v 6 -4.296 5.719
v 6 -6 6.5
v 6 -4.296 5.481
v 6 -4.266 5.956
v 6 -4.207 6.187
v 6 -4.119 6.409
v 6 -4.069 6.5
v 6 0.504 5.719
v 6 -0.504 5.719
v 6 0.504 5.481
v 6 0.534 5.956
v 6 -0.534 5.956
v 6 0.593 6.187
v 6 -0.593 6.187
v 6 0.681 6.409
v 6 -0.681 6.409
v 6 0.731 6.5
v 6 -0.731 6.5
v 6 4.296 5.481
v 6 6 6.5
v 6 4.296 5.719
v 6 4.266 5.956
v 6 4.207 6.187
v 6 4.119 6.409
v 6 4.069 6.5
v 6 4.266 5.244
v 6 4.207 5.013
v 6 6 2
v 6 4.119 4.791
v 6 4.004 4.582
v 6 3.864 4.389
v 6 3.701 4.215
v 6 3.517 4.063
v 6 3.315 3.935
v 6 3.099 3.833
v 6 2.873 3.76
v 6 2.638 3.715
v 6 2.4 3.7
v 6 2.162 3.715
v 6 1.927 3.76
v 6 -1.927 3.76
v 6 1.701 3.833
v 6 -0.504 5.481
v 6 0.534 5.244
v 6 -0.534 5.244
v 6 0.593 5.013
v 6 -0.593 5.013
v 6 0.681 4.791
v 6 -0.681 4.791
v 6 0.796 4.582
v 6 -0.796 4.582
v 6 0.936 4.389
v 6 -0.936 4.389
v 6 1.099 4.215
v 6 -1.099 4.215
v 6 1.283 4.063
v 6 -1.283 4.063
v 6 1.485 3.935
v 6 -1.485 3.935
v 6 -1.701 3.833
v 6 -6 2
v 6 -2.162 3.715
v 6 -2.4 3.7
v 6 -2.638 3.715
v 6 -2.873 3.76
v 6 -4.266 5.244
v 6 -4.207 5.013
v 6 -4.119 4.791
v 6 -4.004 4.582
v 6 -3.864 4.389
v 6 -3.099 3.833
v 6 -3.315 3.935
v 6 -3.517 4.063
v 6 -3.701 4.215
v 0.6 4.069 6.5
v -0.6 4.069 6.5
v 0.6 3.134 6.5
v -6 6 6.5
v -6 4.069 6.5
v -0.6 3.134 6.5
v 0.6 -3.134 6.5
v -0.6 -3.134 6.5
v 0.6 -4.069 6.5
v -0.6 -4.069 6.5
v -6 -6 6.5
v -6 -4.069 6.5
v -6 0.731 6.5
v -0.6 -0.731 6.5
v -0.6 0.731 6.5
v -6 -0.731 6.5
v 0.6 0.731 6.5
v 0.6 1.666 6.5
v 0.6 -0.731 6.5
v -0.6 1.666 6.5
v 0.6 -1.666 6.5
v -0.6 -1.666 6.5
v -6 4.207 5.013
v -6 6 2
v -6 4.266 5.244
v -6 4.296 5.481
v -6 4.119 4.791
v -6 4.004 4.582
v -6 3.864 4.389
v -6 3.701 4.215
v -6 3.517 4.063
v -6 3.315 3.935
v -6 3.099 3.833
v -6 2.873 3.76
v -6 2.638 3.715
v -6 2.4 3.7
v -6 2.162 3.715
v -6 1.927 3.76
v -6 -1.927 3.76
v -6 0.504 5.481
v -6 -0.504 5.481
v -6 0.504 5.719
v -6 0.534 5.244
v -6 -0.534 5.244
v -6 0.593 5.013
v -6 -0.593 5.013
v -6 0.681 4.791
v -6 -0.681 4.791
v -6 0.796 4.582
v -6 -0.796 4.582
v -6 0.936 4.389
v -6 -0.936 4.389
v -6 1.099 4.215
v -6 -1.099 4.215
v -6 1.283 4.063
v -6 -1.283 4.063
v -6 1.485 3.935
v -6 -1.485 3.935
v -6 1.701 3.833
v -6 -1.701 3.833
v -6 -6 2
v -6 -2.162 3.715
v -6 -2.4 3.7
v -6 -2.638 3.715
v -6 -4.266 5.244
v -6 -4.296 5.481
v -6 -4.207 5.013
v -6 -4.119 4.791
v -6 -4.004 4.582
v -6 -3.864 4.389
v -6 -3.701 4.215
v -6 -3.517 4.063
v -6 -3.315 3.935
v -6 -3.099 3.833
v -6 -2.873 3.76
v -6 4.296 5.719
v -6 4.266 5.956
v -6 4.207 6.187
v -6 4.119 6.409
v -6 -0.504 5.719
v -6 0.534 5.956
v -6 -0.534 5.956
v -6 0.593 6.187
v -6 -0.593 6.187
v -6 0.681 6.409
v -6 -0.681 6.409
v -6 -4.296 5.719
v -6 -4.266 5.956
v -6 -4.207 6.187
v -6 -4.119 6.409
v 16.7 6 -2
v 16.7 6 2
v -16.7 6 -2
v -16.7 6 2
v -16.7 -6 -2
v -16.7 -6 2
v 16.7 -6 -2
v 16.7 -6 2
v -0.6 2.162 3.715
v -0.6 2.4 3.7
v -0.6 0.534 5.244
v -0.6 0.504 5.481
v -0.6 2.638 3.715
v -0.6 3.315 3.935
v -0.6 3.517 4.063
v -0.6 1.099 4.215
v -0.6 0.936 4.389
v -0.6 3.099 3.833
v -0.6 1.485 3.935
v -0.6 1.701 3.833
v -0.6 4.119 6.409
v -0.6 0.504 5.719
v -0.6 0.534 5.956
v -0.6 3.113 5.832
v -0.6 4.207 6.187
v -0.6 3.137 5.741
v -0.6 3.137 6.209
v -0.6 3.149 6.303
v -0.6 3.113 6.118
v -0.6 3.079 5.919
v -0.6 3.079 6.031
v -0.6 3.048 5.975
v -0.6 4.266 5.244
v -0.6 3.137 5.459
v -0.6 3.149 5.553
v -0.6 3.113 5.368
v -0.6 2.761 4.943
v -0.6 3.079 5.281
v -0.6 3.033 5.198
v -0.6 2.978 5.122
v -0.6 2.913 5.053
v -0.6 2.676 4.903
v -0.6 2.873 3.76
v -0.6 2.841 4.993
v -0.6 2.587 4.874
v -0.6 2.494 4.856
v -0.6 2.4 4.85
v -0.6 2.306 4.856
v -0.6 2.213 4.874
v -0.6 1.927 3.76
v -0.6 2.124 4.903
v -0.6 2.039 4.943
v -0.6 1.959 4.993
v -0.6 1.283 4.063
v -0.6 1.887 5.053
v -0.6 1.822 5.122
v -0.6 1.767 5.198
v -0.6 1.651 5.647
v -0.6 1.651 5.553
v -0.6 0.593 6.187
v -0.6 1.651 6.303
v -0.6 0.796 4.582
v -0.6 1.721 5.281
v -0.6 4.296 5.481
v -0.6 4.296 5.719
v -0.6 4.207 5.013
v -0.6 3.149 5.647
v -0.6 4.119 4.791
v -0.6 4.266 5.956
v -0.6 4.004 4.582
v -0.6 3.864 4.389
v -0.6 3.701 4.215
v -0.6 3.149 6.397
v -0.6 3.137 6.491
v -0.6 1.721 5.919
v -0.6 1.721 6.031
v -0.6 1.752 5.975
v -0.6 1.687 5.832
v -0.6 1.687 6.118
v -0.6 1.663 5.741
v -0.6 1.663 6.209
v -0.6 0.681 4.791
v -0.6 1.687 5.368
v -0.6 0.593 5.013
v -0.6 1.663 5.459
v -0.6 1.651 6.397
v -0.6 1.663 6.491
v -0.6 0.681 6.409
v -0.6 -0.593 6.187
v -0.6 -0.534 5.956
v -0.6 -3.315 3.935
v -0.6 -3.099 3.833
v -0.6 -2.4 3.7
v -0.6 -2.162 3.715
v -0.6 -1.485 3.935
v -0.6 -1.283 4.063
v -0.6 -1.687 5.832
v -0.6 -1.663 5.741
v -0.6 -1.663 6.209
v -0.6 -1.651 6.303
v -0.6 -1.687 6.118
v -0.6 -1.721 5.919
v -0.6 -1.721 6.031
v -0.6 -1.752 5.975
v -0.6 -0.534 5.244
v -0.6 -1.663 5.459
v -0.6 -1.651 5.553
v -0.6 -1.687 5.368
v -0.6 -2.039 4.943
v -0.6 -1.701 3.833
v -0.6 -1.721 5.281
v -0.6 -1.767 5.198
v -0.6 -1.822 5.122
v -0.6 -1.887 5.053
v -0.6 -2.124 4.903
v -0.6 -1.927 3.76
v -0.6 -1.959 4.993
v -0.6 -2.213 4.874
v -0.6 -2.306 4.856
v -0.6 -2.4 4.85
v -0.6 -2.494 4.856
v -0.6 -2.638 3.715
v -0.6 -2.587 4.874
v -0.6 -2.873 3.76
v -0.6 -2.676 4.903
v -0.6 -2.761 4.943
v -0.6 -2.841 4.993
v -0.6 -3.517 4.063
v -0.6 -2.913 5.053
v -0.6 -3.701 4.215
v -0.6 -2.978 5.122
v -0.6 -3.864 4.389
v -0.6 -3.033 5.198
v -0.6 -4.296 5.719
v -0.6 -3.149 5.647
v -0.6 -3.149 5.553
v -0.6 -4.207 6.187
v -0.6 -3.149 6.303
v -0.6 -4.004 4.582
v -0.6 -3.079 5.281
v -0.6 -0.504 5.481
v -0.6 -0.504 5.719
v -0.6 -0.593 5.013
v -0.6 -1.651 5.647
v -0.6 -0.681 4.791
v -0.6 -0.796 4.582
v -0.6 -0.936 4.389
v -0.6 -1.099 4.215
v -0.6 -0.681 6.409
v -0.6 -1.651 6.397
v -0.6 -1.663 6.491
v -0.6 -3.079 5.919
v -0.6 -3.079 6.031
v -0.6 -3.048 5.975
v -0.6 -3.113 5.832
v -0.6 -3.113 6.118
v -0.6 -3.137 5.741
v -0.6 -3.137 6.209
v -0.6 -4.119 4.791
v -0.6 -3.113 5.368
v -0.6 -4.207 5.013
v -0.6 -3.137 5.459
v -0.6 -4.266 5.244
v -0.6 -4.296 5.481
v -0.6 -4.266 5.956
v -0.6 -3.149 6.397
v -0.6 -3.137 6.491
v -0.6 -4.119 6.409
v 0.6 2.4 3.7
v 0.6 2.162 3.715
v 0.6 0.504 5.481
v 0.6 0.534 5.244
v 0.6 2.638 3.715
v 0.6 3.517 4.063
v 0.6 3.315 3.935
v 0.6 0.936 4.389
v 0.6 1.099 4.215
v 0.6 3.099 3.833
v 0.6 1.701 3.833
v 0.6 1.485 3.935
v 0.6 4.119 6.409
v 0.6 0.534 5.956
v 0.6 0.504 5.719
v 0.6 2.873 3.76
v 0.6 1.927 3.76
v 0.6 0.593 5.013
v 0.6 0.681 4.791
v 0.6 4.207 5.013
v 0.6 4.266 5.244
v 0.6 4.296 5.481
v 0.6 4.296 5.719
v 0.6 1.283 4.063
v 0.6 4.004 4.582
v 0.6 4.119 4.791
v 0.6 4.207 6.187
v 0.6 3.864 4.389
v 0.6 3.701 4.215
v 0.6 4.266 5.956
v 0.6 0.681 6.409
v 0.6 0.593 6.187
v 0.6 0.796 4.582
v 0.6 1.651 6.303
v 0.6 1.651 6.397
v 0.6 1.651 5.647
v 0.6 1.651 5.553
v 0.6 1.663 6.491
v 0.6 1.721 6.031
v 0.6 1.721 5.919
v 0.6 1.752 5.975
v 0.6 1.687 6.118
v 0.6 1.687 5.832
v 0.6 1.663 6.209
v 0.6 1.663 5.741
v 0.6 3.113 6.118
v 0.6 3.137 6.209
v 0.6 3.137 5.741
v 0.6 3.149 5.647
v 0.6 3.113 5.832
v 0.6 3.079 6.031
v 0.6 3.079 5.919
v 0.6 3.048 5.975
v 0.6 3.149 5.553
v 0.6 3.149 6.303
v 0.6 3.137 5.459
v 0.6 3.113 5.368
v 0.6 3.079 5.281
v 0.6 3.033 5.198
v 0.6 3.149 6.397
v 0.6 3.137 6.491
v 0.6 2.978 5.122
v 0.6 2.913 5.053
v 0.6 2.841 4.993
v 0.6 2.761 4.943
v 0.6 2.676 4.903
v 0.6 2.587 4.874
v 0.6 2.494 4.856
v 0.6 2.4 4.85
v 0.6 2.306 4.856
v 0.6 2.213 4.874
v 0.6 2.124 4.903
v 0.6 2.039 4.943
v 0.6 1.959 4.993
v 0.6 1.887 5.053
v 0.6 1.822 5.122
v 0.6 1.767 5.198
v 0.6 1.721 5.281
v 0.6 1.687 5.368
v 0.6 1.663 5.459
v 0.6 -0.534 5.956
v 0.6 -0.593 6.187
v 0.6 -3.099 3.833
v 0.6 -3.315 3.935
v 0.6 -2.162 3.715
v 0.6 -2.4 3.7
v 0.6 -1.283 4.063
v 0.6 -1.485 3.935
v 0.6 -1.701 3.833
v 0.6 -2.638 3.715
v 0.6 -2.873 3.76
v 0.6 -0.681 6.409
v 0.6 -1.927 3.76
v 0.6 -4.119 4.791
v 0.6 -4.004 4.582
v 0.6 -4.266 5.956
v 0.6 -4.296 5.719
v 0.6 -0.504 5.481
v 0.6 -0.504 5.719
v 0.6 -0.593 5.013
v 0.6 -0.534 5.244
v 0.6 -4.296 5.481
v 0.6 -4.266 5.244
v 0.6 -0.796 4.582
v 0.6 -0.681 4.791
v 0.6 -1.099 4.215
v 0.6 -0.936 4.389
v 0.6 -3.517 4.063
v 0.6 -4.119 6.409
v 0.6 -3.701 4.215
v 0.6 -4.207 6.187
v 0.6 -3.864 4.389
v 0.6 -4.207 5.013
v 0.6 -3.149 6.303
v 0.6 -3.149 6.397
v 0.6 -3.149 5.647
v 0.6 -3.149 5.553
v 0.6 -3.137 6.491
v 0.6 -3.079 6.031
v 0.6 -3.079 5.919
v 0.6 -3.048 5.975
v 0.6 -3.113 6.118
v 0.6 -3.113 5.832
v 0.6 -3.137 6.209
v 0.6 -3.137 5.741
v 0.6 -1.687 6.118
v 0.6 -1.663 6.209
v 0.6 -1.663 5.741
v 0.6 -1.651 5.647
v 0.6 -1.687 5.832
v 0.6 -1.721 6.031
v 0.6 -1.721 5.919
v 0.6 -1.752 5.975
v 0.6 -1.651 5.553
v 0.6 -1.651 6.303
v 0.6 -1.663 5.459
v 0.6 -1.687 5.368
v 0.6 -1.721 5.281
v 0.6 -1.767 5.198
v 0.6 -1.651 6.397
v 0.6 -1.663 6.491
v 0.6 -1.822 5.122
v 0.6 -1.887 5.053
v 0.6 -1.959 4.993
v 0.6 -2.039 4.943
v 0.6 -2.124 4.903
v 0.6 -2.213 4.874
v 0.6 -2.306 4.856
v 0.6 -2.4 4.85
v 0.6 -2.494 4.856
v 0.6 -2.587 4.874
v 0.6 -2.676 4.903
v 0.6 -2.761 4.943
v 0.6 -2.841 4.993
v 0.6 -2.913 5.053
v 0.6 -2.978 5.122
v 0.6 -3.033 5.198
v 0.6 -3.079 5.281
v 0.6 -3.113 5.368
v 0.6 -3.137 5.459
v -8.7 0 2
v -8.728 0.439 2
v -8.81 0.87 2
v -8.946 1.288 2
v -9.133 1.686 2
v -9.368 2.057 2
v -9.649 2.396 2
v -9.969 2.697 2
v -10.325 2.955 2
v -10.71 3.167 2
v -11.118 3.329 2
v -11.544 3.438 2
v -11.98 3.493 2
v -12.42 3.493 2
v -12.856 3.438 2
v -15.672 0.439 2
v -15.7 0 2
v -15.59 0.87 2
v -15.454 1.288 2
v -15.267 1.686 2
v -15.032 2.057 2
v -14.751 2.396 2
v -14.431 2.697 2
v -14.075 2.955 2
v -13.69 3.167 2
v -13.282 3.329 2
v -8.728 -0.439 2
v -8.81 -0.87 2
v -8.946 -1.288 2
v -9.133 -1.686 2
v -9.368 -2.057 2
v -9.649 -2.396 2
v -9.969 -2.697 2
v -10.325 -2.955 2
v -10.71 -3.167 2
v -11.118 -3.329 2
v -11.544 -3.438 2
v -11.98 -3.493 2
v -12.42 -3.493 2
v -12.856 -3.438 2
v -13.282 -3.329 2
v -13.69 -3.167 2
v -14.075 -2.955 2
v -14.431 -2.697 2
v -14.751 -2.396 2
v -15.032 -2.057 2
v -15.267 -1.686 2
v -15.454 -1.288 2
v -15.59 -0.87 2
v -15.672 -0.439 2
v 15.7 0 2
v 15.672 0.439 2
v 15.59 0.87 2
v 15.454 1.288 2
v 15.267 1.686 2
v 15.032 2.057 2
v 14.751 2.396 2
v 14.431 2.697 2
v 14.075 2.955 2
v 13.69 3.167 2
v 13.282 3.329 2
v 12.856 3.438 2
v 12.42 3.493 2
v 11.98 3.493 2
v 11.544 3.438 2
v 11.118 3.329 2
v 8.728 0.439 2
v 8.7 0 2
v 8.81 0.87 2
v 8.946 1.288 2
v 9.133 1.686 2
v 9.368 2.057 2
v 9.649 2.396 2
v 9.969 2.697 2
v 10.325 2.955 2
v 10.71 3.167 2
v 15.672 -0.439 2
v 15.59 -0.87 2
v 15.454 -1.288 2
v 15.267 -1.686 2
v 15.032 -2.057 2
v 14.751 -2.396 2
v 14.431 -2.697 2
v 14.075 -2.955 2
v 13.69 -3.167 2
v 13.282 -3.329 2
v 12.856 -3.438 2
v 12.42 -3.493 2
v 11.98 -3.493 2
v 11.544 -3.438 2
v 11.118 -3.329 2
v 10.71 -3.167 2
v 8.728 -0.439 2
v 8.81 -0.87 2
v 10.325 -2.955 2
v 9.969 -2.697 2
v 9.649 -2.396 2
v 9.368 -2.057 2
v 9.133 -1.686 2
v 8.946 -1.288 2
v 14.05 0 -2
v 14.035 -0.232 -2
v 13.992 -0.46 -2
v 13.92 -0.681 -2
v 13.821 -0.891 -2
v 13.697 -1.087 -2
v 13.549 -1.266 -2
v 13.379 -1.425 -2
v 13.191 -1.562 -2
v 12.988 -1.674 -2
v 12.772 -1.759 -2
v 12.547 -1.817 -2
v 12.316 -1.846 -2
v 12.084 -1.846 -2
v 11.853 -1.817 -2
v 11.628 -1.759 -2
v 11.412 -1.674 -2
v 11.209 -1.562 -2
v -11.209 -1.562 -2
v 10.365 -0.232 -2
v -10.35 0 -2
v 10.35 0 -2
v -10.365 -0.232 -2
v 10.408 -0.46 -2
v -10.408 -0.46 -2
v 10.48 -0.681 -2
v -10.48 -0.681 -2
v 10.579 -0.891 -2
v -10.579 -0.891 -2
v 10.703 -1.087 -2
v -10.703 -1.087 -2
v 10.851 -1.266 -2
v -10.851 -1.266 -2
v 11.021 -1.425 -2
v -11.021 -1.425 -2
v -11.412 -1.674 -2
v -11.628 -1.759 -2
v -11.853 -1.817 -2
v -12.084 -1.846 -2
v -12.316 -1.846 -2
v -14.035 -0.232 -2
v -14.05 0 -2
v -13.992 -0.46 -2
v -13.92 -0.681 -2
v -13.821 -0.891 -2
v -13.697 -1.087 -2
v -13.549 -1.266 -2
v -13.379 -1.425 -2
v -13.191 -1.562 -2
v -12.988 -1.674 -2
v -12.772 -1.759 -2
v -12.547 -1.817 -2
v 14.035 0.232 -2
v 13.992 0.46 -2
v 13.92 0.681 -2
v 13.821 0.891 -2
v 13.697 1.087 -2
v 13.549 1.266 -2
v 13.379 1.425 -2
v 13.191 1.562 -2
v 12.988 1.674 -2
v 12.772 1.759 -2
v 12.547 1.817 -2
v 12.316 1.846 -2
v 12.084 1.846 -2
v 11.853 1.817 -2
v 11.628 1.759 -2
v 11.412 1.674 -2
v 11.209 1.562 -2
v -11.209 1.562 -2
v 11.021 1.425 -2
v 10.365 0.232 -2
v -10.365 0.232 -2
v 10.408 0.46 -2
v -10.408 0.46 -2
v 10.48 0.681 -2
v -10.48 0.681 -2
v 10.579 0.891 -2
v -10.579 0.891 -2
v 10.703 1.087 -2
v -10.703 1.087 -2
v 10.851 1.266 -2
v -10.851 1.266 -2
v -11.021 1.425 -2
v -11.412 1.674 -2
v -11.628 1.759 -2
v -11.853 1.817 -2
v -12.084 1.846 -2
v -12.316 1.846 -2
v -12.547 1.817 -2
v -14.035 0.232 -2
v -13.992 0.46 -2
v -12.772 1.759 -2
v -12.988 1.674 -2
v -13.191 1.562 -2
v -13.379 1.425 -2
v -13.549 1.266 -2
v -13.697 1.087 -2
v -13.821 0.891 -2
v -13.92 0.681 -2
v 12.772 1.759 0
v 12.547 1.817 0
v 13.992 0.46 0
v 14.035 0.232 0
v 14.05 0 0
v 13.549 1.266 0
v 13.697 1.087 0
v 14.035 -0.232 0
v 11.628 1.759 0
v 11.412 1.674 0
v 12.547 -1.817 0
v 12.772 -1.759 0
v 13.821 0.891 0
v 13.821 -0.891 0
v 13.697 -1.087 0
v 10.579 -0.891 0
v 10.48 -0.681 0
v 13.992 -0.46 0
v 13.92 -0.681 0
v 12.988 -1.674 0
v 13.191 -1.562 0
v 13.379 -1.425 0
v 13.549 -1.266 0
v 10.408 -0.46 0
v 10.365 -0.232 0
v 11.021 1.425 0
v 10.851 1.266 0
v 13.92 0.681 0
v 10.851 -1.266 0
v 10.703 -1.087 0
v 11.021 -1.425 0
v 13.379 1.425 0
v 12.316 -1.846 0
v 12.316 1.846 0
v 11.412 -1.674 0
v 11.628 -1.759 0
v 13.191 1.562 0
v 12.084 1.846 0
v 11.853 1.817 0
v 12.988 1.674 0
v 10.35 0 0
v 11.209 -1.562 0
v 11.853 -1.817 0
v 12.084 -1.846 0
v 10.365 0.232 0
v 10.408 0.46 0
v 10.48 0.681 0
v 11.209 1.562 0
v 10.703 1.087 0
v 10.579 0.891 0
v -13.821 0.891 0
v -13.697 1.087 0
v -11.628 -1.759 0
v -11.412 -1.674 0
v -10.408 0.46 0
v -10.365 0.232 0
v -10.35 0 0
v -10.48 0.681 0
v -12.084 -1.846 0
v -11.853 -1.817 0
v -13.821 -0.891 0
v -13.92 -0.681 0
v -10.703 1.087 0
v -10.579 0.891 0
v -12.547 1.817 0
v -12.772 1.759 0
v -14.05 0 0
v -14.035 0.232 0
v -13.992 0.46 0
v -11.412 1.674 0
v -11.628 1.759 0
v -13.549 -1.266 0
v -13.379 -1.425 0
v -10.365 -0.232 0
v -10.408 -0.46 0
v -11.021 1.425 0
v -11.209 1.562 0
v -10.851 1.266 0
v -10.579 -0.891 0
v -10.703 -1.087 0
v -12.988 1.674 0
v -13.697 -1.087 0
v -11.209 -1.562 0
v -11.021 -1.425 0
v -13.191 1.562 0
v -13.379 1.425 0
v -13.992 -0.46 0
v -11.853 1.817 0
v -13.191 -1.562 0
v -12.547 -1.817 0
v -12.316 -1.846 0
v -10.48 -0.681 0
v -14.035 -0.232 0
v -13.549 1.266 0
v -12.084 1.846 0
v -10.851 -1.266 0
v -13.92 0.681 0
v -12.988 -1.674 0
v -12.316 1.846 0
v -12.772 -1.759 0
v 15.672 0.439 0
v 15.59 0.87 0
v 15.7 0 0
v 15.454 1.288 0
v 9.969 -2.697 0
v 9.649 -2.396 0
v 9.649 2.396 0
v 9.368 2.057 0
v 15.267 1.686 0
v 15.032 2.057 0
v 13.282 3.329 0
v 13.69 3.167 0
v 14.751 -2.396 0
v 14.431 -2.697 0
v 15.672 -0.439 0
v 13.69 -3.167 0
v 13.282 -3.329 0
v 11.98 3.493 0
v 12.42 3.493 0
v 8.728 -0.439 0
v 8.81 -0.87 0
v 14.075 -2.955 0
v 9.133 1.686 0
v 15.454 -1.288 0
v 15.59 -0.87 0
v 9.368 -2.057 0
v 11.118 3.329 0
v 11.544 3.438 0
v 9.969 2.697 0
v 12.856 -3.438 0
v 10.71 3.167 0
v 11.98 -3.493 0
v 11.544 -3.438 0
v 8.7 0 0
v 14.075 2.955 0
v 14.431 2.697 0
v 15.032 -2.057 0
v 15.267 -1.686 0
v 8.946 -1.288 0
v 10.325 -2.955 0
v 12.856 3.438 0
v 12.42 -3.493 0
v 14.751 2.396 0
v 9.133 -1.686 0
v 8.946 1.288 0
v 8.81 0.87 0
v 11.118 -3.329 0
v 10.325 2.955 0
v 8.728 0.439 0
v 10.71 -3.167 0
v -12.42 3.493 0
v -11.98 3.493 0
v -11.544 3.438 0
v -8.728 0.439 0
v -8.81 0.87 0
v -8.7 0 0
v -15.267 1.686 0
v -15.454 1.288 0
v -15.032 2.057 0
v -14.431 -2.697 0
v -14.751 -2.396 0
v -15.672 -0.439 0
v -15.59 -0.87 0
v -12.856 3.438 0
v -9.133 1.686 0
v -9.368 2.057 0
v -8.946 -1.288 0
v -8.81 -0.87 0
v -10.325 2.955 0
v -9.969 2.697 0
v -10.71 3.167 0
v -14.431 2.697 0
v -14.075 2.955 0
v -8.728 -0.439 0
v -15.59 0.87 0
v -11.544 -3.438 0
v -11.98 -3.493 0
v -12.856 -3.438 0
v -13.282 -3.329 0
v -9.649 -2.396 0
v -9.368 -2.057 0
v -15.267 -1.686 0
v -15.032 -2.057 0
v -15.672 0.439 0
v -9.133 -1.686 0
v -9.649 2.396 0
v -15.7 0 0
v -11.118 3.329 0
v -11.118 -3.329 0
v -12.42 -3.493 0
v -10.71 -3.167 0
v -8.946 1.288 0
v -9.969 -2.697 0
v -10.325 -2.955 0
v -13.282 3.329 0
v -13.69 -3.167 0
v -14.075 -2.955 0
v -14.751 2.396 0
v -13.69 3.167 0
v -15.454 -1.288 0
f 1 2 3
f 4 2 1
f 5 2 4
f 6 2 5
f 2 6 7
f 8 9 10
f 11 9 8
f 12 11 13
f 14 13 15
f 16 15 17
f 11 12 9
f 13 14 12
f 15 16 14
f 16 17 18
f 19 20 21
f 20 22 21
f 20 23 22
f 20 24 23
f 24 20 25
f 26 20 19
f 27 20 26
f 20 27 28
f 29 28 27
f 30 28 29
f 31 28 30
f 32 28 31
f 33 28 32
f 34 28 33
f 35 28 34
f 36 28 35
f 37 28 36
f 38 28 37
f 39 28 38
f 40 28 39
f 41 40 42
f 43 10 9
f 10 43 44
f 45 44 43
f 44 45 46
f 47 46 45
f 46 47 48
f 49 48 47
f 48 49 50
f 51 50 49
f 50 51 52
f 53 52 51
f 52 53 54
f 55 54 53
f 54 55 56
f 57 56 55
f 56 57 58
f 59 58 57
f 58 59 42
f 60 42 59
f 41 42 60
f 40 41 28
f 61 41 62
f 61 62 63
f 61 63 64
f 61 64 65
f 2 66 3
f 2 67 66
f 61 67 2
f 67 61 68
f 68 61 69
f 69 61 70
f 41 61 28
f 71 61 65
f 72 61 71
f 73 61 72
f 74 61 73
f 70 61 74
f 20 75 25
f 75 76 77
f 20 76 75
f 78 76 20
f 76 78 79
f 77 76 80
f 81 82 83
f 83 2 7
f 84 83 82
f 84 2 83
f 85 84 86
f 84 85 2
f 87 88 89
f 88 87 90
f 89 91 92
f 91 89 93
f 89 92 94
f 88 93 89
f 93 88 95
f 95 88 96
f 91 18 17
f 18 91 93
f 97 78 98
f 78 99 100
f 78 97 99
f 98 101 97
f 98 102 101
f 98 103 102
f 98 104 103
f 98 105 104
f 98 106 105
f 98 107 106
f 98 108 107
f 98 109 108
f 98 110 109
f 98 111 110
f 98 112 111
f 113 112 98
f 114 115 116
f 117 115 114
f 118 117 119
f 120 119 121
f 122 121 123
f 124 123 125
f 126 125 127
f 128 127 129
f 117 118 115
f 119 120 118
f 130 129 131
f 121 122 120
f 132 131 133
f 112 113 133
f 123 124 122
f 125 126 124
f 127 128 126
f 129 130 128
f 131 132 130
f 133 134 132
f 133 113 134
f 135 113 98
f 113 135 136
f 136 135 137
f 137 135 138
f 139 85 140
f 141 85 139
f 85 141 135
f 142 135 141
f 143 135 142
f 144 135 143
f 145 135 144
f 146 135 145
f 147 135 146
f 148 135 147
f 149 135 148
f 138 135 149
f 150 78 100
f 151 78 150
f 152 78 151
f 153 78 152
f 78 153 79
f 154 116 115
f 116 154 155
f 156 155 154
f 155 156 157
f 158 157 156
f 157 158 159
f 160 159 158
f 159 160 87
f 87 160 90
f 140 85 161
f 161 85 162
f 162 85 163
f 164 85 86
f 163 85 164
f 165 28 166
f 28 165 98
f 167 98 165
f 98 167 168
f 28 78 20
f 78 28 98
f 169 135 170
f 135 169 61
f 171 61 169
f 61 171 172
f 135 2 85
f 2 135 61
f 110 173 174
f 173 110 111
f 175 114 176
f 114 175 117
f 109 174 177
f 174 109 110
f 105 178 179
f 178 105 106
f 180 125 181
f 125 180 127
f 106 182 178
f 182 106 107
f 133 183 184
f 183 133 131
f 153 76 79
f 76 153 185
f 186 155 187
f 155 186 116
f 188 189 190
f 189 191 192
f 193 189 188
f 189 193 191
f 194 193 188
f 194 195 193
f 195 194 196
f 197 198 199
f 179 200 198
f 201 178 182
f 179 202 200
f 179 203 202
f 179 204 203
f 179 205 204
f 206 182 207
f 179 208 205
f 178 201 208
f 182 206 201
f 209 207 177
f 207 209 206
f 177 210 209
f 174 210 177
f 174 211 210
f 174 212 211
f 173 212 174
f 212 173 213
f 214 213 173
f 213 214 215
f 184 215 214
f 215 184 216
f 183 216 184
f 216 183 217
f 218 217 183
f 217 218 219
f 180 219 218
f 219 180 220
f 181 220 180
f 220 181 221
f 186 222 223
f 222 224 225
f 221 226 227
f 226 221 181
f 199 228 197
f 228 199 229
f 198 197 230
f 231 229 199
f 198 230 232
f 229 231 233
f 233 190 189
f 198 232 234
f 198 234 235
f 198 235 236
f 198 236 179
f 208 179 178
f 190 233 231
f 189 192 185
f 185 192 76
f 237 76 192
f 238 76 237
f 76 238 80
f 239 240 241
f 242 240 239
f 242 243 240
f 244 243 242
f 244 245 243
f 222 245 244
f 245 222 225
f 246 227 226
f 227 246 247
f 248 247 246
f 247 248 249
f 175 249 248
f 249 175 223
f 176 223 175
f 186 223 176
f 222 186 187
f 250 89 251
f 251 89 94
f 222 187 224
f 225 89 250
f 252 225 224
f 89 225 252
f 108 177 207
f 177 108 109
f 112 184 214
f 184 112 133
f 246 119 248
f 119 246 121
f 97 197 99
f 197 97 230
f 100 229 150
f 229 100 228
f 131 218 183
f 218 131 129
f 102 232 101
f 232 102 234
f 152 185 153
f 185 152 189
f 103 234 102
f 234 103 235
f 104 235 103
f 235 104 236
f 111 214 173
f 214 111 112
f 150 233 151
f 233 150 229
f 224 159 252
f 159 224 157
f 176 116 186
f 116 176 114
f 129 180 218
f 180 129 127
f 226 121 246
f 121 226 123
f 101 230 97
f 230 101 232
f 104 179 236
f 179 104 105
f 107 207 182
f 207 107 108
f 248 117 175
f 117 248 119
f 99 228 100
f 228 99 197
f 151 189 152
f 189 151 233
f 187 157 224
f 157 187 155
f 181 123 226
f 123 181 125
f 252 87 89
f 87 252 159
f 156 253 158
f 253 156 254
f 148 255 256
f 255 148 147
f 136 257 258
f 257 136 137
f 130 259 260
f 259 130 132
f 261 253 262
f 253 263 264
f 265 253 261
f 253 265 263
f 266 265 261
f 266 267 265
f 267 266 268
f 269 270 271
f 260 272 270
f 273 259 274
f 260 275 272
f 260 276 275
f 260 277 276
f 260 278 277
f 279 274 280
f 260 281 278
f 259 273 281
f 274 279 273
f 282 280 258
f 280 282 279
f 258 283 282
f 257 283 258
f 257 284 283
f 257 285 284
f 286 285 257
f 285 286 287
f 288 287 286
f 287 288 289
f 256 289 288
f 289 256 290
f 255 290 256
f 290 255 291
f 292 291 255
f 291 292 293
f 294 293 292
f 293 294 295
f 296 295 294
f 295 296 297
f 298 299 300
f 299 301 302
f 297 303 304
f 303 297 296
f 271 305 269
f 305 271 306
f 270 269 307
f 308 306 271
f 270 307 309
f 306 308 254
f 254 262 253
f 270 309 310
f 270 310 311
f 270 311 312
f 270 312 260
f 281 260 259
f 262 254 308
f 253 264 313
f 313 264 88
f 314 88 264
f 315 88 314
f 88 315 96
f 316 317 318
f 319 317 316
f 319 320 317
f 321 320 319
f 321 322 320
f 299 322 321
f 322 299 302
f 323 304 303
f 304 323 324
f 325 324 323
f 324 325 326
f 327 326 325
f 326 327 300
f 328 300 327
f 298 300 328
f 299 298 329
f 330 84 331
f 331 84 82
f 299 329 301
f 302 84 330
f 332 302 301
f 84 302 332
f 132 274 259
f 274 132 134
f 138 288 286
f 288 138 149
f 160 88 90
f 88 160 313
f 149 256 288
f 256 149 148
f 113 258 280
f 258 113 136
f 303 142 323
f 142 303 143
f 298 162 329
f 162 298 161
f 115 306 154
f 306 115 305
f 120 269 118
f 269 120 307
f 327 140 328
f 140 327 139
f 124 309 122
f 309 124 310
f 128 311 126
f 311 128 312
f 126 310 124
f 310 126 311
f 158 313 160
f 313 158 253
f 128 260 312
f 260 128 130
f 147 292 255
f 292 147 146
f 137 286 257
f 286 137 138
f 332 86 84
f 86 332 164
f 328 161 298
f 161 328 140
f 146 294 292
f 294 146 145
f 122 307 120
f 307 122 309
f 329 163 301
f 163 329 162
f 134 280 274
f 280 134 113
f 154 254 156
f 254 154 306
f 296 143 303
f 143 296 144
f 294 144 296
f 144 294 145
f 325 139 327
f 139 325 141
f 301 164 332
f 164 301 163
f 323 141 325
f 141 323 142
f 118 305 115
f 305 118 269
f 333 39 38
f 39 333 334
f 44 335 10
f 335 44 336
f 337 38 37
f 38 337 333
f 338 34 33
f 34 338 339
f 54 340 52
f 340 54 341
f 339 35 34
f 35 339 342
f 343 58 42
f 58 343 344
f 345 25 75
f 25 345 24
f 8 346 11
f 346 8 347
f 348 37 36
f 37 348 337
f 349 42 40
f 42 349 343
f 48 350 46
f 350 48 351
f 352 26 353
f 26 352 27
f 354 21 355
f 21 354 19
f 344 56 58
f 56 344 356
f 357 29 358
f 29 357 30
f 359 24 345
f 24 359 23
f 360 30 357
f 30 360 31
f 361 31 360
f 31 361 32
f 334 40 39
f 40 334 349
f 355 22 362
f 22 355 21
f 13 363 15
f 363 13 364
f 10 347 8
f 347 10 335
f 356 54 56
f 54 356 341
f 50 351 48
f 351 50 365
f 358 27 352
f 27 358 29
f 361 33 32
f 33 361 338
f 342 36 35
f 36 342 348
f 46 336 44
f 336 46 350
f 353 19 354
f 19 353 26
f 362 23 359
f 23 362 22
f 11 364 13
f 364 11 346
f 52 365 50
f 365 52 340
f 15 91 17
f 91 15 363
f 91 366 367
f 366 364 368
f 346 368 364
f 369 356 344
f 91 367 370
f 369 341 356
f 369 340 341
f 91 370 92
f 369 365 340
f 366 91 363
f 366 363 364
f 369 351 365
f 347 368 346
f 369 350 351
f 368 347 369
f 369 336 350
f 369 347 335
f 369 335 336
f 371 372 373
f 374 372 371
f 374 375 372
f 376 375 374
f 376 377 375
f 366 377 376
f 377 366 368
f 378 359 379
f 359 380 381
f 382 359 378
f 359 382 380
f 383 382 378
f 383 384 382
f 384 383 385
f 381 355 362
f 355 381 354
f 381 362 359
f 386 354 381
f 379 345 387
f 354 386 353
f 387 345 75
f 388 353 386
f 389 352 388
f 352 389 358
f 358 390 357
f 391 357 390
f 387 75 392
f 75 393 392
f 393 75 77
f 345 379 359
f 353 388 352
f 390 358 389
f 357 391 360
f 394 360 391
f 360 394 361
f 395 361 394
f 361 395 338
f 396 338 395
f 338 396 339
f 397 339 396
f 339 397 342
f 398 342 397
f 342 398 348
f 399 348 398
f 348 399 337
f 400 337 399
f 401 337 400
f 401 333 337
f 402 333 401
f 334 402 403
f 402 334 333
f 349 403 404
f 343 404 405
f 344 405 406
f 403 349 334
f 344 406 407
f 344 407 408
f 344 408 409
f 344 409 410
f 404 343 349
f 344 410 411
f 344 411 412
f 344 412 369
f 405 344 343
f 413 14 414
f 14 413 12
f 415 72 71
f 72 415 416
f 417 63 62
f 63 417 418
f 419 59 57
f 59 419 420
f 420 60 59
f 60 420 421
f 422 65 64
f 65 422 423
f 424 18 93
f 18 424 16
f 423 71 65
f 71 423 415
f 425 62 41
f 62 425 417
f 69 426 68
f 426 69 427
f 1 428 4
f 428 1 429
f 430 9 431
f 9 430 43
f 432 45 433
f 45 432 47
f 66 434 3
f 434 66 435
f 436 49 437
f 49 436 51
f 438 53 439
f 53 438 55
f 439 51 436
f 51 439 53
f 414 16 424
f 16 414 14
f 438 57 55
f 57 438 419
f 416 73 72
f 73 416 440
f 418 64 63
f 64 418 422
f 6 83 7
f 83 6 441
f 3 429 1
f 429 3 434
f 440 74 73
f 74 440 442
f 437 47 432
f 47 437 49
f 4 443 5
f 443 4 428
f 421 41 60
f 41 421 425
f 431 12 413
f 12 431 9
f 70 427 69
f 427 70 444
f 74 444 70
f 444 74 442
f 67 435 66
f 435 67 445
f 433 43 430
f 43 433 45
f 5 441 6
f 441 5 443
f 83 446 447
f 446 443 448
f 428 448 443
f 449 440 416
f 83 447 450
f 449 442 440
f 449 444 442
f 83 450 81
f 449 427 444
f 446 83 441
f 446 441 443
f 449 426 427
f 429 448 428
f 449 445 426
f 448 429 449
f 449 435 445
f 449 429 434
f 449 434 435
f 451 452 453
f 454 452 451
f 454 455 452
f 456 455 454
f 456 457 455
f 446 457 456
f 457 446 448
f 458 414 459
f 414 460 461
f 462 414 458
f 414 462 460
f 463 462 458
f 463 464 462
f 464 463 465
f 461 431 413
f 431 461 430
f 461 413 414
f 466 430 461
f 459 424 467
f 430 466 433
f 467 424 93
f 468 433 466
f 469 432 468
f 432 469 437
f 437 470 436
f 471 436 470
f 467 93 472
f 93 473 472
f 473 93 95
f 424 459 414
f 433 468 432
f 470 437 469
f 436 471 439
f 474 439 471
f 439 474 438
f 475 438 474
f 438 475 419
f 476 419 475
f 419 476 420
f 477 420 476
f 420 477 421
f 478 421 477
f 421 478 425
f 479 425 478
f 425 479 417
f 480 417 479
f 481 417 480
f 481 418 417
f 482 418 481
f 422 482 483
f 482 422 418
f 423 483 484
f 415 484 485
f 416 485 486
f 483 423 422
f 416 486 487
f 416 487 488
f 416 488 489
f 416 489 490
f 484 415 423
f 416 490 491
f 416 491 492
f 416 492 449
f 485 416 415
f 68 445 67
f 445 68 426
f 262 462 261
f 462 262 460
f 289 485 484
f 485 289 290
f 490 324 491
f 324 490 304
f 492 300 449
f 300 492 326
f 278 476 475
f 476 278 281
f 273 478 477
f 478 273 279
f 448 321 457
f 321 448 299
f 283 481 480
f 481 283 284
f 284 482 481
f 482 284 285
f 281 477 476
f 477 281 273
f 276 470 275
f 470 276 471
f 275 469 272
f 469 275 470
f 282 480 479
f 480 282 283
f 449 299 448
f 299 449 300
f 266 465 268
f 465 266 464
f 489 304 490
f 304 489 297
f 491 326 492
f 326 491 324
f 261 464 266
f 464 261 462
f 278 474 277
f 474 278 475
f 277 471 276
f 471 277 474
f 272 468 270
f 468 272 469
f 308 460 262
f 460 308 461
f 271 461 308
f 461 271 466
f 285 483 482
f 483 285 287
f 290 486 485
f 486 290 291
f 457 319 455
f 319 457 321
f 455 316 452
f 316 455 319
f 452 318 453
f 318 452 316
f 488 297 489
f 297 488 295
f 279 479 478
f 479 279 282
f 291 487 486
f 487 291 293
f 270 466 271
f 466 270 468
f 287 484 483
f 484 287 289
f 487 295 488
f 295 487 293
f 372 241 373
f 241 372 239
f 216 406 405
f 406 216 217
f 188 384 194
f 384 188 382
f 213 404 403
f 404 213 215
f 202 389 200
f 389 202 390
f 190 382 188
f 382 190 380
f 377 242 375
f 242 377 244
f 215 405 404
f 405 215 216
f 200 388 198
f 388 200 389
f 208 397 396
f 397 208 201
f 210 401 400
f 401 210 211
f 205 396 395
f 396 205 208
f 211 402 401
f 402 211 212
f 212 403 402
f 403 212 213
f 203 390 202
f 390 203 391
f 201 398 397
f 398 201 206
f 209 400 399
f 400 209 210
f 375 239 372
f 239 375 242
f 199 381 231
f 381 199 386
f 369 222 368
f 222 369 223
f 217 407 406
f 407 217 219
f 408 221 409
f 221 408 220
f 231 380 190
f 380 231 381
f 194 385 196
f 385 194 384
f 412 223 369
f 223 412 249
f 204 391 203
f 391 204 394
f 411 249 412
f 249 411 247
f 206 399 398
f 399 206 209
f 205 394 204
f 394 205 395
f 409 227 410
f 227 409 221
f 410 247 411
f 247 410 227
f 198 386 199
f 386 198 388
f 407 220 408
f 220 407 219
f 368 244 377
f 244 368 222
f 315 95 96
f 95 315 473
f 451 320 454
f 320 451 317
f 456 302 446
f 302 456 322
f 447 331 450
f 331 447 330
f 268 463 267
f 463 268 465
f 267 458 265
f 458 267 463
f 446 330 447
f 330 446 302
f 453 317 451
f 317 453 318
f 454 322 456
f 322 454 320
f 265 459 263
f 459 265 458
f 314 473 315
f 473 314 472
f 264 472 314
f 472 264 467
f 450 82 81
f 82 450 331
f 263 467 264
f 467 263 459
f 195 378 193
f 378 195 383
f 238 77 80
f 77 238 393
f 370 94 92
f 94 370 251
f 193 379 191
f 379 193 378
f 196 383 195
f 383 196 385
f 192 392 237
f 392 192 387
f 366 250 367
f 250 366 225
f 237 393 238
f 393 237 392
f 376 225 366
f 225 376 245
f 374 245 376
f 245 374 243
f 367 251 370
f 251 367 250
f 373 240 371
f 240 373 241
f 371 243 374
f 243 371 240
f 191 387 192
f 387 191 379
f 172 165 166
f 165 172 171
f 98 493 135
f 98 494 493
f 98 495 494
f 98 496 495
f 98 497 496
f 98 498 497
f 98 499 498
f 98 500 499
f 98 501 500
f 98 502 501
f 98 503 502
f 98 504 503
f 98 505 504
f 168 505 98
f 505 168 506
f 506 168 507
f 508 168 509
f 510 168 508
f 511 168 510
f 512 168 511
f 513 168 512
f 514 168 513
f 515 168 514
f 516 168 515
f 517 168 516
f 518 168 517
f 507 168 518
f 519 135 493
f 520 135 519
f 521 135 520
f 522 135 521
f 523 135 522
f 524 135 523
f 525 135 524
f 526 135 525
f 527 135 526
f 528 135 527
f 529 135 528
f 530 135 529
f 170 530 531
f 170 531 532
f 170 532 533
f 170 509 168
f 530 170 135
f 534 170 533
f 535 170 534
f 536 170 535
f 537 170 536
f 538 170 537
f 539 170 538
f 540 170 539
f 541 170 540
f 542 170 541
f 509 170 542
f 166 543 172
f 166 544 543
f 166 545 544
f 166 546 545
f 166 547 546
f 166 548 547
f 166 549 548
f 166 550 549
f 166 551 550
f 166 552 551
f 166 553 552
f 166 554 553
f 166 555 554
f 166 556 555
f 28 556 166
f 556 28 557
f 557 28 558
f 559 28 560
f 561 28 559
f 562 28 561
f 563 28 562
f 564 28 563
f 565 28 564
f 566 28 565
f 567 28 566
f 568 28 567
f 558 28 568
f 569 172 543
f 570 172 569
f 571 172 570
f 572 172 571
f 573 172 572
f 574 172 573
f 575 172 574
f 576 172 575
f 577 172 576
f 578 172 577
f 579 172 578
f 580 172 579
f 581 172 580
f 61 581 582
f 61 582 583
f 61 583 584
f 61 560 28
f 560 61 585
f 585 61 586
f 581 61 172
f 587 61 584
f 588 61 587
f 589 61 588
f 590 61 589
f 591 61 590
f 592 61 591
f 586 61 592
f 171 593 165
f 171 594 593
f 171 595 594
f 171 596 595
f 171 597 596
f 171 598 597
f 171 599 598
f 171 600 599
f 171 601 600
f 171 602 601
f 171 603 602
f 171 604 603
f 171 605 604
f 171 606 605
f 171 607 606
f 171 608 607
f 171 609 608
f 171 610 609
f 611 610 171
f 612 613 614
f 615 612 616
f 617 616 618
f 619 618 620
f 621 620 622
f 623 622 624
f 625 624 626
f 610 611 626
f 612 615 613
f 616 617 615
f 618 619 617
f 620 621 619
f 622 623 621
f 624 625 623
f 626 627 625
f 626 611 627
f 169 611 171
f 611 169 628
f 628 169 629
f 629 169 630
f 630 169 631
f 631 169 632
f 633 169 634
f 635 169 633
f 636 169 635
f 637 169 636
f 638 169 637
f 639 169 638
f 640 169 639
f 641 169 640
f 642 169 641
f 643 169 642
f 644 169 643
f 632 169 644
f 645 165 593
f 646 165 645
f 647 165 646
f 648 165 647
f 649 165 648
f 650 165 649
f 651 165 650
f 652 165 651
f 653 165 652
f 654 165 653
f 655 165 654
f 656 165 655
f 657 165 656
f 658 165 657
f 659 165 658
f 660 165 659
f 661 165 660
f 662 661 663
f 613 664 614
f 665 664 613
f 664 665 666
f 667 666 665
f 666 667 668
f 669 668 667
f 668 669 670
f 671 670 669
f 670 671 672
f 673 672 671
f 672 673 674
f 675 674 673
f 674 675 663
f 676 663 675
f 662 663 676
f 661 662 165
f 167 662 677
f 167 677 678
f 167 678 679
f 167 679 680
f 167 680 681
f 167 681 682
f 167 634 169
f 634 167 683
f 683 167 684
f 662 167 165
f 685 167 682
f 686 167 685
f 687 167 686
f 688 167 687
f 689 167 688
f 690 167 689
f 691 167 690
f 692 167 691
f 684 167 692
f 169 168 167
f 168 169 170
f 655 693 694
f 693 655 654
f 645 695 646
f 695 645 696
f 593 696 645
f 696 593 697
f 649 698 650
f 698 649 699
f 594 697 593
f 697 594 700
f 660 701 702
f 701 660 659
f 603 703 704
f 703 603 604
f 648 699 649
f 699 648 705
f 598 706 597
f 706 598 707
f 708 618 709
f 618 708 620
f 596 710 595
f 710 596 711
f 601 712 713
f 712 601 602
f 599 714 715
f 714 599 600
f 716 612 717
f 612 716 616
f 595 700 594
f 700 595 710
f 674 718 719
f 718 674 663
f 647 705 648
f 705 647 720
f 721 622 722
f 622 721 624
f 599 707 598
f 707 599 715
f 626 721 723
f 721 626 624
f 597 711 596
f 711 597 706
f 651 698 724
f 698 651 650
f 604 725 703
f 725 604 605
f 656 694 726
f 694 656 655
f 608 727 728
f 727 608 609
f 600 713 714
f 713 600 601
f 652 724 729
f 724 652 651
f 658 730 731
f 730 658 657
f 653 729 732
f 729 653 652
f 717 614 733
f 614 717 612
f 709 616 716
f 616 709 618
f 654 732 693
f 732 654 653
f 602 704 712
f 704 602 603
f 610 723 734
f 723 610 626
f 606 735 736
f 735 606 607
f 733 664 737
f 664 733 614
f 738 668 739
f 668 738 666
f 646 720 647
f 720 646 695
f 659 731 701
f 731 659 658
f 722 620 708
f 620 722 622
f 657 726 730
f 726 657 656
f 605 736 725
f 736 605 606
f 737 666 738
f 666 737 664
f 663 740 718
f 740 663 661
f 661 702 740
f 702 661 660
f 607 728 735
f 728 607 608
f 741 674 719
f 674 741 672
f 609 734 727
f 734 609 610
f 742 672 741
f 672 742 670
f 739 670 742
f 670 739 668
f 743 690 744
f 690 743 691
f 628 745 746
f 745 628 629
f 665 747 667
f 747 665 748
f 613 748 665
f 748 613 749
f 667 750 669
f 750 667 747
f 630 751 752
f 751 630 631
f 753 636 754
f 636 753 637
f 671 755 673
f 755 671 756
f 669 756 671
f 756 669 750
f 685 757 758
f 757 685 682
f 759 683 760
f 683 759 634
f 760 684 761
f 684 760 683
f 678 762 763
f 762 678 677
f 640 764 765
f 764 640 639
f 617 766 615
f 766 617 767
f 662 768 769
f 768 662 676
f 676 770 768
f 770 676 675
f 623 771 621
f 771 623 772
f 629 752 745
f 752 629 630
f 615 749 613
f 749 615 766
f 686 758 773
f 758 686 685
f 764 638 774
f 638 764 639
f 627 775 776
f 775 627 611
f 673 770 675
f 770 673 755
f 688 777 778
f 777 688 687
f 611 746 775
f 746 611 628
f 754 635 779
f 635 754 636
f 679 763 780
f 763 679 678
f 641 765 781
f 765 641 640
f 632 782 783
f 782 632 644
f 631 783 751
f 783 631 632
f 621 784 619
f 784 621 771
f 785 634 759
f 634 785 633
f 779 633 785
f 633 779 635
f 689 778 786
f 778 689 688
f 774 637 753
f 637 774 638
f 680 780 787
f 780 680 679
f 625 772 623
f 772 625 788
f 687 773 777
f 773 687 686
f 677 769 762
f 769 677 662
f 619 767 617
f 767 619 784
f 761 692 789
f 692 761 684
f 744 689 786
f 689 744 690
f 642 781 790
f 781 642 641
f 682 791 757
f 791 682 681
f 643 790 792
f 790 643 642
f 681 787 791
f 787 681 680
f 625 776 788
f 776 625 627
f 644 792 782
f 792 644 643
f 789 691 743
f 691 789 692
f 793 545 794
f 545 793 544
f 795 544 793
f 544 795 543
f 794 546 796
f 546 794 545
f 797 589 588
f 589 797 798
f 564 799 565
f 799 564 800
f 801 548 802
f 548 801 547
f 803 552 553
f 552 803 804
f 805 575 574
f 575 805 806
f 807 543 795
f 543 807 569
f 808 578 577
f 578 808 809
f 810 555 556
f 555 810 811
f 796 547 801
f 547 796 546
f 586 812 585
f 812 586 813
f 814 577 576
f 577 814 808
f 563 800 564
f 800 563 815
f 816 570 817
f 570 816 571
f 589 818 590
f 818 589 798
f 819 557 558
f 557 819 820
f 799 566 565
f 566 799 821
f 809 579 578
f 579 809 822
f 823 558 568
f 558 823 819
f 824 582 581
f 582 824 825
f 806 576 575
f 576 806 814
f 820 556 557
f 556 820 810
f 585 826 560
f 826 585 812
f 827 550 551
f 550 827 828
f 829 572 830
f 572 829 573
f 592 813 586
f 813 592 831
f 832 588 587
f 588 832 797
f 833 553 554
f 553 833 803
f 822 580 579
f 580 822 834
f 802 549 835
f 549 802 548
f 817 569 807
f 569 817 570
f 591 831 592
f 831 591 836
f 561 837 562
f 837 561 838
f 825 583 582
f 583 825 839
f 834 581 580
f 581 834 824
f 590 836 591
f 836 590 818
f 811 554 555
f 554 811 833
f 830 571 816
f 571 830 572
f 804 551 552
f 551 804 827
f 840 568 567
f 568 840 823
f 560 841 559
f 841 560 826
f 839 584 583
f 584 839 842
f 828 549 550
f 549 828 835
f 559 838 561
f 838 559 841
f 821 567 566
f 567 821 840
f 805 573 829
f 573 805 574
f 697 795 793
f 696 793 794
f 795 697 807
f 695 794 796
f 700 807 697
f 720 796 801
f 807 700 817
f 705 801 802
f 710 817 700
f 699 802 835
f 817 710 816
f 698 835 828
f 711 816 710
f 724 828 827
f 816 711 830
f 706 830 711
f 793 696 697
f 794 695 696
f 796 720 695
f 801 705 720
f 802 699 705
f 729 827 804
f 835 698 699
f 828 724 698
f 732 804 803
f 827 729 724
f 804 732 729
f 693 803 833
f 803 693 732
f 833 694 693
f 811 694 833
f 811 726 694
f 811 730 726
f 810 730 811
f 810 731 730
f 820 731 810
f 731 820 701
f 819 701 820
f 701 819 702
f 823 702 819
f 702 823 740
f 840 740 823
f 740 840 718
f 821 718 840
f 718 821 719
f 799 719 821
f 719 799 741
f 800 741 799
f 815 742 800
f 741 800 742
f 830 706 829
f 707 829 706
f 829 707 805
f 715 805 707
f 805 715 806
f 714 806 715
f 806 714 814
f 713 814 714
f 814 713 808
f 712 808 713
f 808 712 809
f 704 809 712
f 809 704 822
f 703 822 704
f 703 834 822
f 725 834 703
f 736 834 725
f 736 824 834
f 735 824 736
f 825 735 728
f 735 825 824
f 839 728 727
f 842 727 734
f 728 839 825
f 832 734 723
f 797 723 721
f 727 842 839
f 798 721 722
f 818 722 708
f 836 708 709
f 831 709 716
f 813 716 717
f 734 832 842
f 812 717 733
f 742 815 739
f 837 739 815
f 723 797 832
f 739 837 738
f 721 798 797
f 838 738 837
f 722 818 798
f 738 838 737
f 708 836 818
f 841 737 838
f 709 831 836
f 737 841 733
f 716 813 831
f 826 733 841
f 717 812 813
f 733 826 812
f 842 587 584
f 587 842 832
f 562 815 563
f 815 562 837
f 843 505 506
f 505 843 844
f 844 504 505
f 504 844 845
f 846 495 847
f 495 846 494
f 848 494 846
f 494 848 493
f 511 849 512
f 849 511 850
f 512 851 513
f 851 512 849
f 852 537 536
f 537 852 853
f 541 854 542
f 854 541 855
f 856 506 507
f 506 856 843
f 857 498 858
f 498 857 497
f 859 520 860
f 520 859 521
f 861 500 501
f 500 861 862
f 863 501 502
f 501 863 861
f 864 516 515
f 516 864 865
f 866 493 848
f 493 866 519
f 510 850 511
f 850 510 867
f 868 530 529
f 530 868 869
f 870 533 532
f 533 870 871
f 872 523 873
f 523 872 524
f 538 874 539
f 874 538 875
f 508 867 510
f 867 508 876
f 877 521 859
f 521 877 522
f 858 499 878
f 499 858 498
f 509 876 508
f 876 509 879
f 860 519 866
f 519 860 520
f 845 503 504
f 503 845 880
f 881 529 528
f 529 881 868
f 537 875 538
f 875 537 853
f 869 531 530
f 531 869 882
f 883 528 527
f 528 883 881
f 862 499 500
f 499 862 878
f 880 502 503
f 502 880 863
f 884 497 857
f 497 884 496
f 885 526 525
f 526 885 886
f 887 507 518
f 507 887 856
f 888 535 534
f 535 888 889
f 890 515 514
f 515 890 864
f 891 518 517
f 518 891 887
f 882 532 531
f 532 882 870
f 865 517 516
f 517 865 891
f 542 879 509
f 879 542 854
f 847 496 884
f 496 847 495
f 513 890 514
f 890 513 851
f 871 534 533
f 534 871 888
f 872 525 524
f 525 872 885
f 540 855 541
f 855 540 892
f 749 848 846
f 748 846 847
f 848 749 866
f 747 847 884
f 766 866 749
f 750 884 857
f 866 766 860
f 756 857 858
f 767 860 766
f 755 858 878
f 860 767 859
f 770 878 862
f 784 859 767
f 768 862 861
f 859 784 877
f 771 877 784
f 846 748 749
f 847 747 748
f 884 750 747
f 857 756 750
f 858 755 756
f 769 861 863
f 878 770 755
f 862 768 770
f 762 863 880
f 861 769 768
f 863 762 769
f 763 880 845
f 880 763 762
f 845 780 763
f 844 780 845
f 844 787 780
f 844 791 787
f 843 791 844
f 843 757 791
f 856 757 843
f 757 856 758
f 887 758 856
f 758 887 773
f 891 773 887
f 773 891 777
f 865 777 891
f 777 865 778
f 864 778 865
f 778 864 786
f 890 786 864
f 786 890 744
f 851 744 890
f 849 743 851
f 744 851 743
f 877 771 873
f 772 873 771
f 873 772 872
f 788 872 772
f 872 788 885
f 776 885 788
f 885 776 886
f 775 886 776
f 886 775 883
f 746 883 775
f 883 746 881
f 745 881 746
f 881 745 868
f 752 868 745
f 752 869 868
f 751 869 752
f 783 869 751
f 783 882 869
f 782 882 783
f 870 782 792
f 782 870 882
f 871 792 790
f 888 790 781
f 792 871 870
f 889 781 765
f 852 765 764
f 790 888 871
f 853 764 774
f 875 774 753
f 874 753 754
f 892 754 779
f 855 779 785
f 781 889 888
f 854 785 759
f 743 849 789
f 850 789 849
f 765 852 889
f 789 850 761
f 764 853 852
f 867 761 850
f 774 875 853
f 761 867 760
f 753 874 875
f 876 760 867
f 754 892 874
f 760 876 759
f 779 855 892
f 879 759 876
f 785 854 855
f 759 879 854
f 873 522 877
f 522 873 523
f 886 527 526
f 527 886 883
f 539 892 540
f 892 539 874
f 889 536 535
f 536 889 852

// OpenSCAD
base_lenght=33.4;
base_width=12;
base_height=4;

holder_base_height=1.6;
holder_lenght=12;
holder_width=12;
holder_height=5;

hole_margin=4.5;
space_between_holes=24;
hole_diameter=3.7;
bolt_head_diameter=7;
bolt_head_hole_depth=2;

chain_diameter=3.8;
chain_ball_space=1.2;

wire_diameter=1.5;
spacing=0.1;

$fn=50;

Assembly();

module Assembly(){
    difference (){
        union(){
            cube([base_lenght,base_width,base_height],center=true);
            translate([0,0,base_height]){
                difference(){
                    cube([holder_lenght,holder_width,holder_height],center=true);
//wire_ball_hole                    
                    translate([-holder_lenght-chain_ball_space/2,chain_diameter/2+spacing*5,holder_base_height]) rotate([0,90,0]) cylinder(d=chain_diameter, h=holder_lenght, center=false);
                    translate([-holder_lenght-chain_ball_space/2,-chain_diameter/2-spacing*5,holder_base_height]) rotate([0,90,0]) cylinder(d=chain_diameter, h=holder_lenght, center=false);
                    
                    
                    translate([chain_ball_space/2,chain_diameter/2+spacing*5,holder_base_height]) rotate([0,90,0]) cylinder(d=chain_diameter, h=holder_lenght, center=false);
                    translate([chain_ball_space/2,-chain_diameter/2-spacing*5,holder_base_height]) rotate([0,90,0]) cylinder(d=chain_diameter, h=holder_lenght, center=false);
//wire_hole_small                    
                    translate([-holder_lenght/2,-chain_diameter/2-spacing*5,holder_base_height]) rotate([0,90,0]) cylinder(d=wire_diameter, h=holder_lenght, center=false);
                    translate([-holder_lenght/2,chain_diameter/2+spacing*5,holder_base_height]) rotate([0,90,0]) cylinder(d=wire_diameter, h=holder_lenght, center=false);
                    
                    translate([-holder_lenght/2,-chain_diameter/2-spacing*5,holder_base_height+wire_diameter/2]) rotate([0,90,0]) cylinder(d=wire_diameter, h=holder_lenght, center=false);
                    translate([-holder_lenght/2,chain_diameter/2+spacing*5,holder_base_height+wire_diameter/2]) rotate([0,90,0]) cylinder(d=wire_diameter, h=holder_lenght, center=false);
                };
                
            };
        };
//bolt hole
        translate([base_lenght/2-hole_margin,0,0])cylinder(d=hole_diameter,h=base_height*2, center=true);
        translate([-(base_lenght/2-hole_margin),0,0])cylinder(d=hole_diameter,h=base_height*2, center=true);  
//bolt head hole
        translate([base_lenght/2-hole_margin,0,base_height/2-bolt_head_hole_depth/2])cylinder(d=bolt_head_diameter,h=bolt_head_hole_depth, center=true);
        translate([-(base_lenght/2-hole_margin),0,base_height/2-bolt_head_hole_depth/2])cylinder(d=bolt_head_diameter,h=bolt_head_hole_depth, center=true);        
      
        
    };
    
    };
